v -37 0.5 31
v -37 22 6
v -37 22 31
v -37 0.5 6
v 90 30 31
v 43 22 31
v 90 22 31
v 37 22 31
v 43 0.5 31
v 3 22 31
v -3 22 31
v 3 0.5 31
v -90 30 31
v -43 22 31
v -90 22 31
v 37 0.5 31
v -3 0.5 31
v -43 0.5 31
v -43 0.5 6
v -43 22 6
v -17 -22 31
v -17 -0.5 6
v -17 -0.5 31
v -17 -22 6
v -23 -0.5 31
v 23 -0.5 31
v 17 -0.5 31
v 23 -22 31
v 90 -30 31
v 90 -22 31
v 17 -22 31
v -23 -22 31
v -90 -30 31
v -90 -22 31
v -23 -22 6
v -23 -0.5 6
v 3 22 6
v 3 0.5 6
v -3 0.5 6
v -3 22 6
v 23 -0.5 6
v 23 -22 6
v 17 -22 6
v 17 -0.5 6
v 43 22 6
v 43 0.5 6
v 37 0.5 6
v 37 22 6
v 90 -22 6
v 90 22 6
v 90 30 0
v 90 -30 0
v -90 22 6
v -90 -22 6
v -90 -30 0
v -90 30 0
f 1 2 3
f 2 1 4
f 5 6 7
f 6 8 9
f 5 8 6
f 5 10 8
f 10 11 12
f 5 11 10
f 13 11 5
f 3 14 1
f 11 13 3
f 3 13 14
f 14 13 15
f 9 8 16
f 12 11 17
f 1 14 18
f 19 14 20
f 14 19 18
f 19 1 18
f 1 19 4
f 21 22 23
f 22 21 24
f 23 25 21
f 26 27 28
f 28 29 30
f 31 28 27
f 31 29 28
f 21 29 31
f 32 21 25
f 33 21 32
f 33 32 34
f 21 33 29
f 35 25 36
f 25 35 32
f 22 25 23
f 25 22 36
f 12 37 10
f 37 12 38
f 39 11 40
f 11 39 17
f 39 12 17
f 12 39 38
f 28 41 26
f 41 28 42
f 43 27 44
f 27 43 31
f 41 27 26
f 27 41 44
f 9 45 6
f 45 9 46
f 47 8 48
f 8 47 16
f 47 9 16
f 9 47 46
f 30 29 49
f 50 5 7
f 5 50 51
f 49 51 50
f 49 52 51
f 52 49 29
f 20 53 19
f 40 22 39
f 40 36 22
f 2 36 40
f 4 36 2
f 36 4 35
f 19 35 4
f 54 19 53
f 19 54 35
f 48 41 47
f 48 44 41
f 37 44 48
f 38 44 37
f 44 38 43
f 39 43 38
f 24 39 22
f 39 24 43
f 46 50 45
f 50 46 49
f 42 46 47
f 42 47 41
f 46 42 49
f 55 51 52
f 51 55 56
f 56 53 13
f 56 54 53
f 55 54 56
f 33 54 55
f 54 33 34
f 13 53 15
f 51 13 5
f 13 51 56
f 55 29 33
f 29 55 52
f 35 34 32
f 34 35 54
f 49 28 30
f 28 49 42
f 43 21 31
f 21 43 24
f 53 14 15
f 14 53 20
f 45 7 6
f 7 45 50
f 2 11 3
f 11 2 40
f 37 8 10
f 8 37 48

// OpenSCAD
$fn = 32;

// ----------------------------------------------------------------------
// Rib frame 180 x 60 x 31
// 5 ribs at 20 mm pitch, staggered
// ----------------------------------------------------------------------

// --- parameters (mm) ---
frame = [180, 60, 6];  // base plate size (x, y, z)
rail_w = 8;            // side rail width
ribs = 5;              // number of ribs
rib_t = 6;             // rib thickness
rib_h = 25;            // rib height above the base plate
pitch = 20;            // pitch between rib centres

// --- derived feature positions (mm) ---
span = (ribs - 1) * pitch;          // = 80   distance between the outer ribs
origin_x = -span / 2;               // = -40   X of the first rib
rib_len = frame[1] / 2 - rail_w + 0.5;  // = 22.5   length of a staggered rib
rib_y = 0.5 + rib_len / 2;          // = 11.75   Y of a staggered rib centre
row_offset = 2 * rib_y;             // = 23.5   distance between the two rows
feature_centers = [
  [origin_x + 0 * pitch, rib_y],
  [origin_x + 1 * pitch, -rib_y],
  [origin_x + 2 * pitch, rib_y],
  [origin_x + 3 * pitch, -rib_y],
  [origin_x + 4 * pitch, rib_y]
];   // rib centre line, drives the rib loop

// base plate, two side rails, then the ribs read straight off feature_centers
union() {
  translate([-frame[0] / 2, -frame[1] / 2, 0]) cube(frame);
  translate([-frame[0] / 2, -frame[1] / 2, 0]) cube([frame[0], rail_w, frame[2] + rib_h]);
  translate([-frame[0] / 2, frame[1] / 2 - rail_w, 0]) cube([frame[0], rail_w, frame[2] + rib_h]);
  for (centre = feature_centers)
    translate([centre[0] - rib_t / 2, centre[1] - rib_len / 2, frame[2] - 1])
      cube([rib_t, rib_len, rib_h + 1]);
}
